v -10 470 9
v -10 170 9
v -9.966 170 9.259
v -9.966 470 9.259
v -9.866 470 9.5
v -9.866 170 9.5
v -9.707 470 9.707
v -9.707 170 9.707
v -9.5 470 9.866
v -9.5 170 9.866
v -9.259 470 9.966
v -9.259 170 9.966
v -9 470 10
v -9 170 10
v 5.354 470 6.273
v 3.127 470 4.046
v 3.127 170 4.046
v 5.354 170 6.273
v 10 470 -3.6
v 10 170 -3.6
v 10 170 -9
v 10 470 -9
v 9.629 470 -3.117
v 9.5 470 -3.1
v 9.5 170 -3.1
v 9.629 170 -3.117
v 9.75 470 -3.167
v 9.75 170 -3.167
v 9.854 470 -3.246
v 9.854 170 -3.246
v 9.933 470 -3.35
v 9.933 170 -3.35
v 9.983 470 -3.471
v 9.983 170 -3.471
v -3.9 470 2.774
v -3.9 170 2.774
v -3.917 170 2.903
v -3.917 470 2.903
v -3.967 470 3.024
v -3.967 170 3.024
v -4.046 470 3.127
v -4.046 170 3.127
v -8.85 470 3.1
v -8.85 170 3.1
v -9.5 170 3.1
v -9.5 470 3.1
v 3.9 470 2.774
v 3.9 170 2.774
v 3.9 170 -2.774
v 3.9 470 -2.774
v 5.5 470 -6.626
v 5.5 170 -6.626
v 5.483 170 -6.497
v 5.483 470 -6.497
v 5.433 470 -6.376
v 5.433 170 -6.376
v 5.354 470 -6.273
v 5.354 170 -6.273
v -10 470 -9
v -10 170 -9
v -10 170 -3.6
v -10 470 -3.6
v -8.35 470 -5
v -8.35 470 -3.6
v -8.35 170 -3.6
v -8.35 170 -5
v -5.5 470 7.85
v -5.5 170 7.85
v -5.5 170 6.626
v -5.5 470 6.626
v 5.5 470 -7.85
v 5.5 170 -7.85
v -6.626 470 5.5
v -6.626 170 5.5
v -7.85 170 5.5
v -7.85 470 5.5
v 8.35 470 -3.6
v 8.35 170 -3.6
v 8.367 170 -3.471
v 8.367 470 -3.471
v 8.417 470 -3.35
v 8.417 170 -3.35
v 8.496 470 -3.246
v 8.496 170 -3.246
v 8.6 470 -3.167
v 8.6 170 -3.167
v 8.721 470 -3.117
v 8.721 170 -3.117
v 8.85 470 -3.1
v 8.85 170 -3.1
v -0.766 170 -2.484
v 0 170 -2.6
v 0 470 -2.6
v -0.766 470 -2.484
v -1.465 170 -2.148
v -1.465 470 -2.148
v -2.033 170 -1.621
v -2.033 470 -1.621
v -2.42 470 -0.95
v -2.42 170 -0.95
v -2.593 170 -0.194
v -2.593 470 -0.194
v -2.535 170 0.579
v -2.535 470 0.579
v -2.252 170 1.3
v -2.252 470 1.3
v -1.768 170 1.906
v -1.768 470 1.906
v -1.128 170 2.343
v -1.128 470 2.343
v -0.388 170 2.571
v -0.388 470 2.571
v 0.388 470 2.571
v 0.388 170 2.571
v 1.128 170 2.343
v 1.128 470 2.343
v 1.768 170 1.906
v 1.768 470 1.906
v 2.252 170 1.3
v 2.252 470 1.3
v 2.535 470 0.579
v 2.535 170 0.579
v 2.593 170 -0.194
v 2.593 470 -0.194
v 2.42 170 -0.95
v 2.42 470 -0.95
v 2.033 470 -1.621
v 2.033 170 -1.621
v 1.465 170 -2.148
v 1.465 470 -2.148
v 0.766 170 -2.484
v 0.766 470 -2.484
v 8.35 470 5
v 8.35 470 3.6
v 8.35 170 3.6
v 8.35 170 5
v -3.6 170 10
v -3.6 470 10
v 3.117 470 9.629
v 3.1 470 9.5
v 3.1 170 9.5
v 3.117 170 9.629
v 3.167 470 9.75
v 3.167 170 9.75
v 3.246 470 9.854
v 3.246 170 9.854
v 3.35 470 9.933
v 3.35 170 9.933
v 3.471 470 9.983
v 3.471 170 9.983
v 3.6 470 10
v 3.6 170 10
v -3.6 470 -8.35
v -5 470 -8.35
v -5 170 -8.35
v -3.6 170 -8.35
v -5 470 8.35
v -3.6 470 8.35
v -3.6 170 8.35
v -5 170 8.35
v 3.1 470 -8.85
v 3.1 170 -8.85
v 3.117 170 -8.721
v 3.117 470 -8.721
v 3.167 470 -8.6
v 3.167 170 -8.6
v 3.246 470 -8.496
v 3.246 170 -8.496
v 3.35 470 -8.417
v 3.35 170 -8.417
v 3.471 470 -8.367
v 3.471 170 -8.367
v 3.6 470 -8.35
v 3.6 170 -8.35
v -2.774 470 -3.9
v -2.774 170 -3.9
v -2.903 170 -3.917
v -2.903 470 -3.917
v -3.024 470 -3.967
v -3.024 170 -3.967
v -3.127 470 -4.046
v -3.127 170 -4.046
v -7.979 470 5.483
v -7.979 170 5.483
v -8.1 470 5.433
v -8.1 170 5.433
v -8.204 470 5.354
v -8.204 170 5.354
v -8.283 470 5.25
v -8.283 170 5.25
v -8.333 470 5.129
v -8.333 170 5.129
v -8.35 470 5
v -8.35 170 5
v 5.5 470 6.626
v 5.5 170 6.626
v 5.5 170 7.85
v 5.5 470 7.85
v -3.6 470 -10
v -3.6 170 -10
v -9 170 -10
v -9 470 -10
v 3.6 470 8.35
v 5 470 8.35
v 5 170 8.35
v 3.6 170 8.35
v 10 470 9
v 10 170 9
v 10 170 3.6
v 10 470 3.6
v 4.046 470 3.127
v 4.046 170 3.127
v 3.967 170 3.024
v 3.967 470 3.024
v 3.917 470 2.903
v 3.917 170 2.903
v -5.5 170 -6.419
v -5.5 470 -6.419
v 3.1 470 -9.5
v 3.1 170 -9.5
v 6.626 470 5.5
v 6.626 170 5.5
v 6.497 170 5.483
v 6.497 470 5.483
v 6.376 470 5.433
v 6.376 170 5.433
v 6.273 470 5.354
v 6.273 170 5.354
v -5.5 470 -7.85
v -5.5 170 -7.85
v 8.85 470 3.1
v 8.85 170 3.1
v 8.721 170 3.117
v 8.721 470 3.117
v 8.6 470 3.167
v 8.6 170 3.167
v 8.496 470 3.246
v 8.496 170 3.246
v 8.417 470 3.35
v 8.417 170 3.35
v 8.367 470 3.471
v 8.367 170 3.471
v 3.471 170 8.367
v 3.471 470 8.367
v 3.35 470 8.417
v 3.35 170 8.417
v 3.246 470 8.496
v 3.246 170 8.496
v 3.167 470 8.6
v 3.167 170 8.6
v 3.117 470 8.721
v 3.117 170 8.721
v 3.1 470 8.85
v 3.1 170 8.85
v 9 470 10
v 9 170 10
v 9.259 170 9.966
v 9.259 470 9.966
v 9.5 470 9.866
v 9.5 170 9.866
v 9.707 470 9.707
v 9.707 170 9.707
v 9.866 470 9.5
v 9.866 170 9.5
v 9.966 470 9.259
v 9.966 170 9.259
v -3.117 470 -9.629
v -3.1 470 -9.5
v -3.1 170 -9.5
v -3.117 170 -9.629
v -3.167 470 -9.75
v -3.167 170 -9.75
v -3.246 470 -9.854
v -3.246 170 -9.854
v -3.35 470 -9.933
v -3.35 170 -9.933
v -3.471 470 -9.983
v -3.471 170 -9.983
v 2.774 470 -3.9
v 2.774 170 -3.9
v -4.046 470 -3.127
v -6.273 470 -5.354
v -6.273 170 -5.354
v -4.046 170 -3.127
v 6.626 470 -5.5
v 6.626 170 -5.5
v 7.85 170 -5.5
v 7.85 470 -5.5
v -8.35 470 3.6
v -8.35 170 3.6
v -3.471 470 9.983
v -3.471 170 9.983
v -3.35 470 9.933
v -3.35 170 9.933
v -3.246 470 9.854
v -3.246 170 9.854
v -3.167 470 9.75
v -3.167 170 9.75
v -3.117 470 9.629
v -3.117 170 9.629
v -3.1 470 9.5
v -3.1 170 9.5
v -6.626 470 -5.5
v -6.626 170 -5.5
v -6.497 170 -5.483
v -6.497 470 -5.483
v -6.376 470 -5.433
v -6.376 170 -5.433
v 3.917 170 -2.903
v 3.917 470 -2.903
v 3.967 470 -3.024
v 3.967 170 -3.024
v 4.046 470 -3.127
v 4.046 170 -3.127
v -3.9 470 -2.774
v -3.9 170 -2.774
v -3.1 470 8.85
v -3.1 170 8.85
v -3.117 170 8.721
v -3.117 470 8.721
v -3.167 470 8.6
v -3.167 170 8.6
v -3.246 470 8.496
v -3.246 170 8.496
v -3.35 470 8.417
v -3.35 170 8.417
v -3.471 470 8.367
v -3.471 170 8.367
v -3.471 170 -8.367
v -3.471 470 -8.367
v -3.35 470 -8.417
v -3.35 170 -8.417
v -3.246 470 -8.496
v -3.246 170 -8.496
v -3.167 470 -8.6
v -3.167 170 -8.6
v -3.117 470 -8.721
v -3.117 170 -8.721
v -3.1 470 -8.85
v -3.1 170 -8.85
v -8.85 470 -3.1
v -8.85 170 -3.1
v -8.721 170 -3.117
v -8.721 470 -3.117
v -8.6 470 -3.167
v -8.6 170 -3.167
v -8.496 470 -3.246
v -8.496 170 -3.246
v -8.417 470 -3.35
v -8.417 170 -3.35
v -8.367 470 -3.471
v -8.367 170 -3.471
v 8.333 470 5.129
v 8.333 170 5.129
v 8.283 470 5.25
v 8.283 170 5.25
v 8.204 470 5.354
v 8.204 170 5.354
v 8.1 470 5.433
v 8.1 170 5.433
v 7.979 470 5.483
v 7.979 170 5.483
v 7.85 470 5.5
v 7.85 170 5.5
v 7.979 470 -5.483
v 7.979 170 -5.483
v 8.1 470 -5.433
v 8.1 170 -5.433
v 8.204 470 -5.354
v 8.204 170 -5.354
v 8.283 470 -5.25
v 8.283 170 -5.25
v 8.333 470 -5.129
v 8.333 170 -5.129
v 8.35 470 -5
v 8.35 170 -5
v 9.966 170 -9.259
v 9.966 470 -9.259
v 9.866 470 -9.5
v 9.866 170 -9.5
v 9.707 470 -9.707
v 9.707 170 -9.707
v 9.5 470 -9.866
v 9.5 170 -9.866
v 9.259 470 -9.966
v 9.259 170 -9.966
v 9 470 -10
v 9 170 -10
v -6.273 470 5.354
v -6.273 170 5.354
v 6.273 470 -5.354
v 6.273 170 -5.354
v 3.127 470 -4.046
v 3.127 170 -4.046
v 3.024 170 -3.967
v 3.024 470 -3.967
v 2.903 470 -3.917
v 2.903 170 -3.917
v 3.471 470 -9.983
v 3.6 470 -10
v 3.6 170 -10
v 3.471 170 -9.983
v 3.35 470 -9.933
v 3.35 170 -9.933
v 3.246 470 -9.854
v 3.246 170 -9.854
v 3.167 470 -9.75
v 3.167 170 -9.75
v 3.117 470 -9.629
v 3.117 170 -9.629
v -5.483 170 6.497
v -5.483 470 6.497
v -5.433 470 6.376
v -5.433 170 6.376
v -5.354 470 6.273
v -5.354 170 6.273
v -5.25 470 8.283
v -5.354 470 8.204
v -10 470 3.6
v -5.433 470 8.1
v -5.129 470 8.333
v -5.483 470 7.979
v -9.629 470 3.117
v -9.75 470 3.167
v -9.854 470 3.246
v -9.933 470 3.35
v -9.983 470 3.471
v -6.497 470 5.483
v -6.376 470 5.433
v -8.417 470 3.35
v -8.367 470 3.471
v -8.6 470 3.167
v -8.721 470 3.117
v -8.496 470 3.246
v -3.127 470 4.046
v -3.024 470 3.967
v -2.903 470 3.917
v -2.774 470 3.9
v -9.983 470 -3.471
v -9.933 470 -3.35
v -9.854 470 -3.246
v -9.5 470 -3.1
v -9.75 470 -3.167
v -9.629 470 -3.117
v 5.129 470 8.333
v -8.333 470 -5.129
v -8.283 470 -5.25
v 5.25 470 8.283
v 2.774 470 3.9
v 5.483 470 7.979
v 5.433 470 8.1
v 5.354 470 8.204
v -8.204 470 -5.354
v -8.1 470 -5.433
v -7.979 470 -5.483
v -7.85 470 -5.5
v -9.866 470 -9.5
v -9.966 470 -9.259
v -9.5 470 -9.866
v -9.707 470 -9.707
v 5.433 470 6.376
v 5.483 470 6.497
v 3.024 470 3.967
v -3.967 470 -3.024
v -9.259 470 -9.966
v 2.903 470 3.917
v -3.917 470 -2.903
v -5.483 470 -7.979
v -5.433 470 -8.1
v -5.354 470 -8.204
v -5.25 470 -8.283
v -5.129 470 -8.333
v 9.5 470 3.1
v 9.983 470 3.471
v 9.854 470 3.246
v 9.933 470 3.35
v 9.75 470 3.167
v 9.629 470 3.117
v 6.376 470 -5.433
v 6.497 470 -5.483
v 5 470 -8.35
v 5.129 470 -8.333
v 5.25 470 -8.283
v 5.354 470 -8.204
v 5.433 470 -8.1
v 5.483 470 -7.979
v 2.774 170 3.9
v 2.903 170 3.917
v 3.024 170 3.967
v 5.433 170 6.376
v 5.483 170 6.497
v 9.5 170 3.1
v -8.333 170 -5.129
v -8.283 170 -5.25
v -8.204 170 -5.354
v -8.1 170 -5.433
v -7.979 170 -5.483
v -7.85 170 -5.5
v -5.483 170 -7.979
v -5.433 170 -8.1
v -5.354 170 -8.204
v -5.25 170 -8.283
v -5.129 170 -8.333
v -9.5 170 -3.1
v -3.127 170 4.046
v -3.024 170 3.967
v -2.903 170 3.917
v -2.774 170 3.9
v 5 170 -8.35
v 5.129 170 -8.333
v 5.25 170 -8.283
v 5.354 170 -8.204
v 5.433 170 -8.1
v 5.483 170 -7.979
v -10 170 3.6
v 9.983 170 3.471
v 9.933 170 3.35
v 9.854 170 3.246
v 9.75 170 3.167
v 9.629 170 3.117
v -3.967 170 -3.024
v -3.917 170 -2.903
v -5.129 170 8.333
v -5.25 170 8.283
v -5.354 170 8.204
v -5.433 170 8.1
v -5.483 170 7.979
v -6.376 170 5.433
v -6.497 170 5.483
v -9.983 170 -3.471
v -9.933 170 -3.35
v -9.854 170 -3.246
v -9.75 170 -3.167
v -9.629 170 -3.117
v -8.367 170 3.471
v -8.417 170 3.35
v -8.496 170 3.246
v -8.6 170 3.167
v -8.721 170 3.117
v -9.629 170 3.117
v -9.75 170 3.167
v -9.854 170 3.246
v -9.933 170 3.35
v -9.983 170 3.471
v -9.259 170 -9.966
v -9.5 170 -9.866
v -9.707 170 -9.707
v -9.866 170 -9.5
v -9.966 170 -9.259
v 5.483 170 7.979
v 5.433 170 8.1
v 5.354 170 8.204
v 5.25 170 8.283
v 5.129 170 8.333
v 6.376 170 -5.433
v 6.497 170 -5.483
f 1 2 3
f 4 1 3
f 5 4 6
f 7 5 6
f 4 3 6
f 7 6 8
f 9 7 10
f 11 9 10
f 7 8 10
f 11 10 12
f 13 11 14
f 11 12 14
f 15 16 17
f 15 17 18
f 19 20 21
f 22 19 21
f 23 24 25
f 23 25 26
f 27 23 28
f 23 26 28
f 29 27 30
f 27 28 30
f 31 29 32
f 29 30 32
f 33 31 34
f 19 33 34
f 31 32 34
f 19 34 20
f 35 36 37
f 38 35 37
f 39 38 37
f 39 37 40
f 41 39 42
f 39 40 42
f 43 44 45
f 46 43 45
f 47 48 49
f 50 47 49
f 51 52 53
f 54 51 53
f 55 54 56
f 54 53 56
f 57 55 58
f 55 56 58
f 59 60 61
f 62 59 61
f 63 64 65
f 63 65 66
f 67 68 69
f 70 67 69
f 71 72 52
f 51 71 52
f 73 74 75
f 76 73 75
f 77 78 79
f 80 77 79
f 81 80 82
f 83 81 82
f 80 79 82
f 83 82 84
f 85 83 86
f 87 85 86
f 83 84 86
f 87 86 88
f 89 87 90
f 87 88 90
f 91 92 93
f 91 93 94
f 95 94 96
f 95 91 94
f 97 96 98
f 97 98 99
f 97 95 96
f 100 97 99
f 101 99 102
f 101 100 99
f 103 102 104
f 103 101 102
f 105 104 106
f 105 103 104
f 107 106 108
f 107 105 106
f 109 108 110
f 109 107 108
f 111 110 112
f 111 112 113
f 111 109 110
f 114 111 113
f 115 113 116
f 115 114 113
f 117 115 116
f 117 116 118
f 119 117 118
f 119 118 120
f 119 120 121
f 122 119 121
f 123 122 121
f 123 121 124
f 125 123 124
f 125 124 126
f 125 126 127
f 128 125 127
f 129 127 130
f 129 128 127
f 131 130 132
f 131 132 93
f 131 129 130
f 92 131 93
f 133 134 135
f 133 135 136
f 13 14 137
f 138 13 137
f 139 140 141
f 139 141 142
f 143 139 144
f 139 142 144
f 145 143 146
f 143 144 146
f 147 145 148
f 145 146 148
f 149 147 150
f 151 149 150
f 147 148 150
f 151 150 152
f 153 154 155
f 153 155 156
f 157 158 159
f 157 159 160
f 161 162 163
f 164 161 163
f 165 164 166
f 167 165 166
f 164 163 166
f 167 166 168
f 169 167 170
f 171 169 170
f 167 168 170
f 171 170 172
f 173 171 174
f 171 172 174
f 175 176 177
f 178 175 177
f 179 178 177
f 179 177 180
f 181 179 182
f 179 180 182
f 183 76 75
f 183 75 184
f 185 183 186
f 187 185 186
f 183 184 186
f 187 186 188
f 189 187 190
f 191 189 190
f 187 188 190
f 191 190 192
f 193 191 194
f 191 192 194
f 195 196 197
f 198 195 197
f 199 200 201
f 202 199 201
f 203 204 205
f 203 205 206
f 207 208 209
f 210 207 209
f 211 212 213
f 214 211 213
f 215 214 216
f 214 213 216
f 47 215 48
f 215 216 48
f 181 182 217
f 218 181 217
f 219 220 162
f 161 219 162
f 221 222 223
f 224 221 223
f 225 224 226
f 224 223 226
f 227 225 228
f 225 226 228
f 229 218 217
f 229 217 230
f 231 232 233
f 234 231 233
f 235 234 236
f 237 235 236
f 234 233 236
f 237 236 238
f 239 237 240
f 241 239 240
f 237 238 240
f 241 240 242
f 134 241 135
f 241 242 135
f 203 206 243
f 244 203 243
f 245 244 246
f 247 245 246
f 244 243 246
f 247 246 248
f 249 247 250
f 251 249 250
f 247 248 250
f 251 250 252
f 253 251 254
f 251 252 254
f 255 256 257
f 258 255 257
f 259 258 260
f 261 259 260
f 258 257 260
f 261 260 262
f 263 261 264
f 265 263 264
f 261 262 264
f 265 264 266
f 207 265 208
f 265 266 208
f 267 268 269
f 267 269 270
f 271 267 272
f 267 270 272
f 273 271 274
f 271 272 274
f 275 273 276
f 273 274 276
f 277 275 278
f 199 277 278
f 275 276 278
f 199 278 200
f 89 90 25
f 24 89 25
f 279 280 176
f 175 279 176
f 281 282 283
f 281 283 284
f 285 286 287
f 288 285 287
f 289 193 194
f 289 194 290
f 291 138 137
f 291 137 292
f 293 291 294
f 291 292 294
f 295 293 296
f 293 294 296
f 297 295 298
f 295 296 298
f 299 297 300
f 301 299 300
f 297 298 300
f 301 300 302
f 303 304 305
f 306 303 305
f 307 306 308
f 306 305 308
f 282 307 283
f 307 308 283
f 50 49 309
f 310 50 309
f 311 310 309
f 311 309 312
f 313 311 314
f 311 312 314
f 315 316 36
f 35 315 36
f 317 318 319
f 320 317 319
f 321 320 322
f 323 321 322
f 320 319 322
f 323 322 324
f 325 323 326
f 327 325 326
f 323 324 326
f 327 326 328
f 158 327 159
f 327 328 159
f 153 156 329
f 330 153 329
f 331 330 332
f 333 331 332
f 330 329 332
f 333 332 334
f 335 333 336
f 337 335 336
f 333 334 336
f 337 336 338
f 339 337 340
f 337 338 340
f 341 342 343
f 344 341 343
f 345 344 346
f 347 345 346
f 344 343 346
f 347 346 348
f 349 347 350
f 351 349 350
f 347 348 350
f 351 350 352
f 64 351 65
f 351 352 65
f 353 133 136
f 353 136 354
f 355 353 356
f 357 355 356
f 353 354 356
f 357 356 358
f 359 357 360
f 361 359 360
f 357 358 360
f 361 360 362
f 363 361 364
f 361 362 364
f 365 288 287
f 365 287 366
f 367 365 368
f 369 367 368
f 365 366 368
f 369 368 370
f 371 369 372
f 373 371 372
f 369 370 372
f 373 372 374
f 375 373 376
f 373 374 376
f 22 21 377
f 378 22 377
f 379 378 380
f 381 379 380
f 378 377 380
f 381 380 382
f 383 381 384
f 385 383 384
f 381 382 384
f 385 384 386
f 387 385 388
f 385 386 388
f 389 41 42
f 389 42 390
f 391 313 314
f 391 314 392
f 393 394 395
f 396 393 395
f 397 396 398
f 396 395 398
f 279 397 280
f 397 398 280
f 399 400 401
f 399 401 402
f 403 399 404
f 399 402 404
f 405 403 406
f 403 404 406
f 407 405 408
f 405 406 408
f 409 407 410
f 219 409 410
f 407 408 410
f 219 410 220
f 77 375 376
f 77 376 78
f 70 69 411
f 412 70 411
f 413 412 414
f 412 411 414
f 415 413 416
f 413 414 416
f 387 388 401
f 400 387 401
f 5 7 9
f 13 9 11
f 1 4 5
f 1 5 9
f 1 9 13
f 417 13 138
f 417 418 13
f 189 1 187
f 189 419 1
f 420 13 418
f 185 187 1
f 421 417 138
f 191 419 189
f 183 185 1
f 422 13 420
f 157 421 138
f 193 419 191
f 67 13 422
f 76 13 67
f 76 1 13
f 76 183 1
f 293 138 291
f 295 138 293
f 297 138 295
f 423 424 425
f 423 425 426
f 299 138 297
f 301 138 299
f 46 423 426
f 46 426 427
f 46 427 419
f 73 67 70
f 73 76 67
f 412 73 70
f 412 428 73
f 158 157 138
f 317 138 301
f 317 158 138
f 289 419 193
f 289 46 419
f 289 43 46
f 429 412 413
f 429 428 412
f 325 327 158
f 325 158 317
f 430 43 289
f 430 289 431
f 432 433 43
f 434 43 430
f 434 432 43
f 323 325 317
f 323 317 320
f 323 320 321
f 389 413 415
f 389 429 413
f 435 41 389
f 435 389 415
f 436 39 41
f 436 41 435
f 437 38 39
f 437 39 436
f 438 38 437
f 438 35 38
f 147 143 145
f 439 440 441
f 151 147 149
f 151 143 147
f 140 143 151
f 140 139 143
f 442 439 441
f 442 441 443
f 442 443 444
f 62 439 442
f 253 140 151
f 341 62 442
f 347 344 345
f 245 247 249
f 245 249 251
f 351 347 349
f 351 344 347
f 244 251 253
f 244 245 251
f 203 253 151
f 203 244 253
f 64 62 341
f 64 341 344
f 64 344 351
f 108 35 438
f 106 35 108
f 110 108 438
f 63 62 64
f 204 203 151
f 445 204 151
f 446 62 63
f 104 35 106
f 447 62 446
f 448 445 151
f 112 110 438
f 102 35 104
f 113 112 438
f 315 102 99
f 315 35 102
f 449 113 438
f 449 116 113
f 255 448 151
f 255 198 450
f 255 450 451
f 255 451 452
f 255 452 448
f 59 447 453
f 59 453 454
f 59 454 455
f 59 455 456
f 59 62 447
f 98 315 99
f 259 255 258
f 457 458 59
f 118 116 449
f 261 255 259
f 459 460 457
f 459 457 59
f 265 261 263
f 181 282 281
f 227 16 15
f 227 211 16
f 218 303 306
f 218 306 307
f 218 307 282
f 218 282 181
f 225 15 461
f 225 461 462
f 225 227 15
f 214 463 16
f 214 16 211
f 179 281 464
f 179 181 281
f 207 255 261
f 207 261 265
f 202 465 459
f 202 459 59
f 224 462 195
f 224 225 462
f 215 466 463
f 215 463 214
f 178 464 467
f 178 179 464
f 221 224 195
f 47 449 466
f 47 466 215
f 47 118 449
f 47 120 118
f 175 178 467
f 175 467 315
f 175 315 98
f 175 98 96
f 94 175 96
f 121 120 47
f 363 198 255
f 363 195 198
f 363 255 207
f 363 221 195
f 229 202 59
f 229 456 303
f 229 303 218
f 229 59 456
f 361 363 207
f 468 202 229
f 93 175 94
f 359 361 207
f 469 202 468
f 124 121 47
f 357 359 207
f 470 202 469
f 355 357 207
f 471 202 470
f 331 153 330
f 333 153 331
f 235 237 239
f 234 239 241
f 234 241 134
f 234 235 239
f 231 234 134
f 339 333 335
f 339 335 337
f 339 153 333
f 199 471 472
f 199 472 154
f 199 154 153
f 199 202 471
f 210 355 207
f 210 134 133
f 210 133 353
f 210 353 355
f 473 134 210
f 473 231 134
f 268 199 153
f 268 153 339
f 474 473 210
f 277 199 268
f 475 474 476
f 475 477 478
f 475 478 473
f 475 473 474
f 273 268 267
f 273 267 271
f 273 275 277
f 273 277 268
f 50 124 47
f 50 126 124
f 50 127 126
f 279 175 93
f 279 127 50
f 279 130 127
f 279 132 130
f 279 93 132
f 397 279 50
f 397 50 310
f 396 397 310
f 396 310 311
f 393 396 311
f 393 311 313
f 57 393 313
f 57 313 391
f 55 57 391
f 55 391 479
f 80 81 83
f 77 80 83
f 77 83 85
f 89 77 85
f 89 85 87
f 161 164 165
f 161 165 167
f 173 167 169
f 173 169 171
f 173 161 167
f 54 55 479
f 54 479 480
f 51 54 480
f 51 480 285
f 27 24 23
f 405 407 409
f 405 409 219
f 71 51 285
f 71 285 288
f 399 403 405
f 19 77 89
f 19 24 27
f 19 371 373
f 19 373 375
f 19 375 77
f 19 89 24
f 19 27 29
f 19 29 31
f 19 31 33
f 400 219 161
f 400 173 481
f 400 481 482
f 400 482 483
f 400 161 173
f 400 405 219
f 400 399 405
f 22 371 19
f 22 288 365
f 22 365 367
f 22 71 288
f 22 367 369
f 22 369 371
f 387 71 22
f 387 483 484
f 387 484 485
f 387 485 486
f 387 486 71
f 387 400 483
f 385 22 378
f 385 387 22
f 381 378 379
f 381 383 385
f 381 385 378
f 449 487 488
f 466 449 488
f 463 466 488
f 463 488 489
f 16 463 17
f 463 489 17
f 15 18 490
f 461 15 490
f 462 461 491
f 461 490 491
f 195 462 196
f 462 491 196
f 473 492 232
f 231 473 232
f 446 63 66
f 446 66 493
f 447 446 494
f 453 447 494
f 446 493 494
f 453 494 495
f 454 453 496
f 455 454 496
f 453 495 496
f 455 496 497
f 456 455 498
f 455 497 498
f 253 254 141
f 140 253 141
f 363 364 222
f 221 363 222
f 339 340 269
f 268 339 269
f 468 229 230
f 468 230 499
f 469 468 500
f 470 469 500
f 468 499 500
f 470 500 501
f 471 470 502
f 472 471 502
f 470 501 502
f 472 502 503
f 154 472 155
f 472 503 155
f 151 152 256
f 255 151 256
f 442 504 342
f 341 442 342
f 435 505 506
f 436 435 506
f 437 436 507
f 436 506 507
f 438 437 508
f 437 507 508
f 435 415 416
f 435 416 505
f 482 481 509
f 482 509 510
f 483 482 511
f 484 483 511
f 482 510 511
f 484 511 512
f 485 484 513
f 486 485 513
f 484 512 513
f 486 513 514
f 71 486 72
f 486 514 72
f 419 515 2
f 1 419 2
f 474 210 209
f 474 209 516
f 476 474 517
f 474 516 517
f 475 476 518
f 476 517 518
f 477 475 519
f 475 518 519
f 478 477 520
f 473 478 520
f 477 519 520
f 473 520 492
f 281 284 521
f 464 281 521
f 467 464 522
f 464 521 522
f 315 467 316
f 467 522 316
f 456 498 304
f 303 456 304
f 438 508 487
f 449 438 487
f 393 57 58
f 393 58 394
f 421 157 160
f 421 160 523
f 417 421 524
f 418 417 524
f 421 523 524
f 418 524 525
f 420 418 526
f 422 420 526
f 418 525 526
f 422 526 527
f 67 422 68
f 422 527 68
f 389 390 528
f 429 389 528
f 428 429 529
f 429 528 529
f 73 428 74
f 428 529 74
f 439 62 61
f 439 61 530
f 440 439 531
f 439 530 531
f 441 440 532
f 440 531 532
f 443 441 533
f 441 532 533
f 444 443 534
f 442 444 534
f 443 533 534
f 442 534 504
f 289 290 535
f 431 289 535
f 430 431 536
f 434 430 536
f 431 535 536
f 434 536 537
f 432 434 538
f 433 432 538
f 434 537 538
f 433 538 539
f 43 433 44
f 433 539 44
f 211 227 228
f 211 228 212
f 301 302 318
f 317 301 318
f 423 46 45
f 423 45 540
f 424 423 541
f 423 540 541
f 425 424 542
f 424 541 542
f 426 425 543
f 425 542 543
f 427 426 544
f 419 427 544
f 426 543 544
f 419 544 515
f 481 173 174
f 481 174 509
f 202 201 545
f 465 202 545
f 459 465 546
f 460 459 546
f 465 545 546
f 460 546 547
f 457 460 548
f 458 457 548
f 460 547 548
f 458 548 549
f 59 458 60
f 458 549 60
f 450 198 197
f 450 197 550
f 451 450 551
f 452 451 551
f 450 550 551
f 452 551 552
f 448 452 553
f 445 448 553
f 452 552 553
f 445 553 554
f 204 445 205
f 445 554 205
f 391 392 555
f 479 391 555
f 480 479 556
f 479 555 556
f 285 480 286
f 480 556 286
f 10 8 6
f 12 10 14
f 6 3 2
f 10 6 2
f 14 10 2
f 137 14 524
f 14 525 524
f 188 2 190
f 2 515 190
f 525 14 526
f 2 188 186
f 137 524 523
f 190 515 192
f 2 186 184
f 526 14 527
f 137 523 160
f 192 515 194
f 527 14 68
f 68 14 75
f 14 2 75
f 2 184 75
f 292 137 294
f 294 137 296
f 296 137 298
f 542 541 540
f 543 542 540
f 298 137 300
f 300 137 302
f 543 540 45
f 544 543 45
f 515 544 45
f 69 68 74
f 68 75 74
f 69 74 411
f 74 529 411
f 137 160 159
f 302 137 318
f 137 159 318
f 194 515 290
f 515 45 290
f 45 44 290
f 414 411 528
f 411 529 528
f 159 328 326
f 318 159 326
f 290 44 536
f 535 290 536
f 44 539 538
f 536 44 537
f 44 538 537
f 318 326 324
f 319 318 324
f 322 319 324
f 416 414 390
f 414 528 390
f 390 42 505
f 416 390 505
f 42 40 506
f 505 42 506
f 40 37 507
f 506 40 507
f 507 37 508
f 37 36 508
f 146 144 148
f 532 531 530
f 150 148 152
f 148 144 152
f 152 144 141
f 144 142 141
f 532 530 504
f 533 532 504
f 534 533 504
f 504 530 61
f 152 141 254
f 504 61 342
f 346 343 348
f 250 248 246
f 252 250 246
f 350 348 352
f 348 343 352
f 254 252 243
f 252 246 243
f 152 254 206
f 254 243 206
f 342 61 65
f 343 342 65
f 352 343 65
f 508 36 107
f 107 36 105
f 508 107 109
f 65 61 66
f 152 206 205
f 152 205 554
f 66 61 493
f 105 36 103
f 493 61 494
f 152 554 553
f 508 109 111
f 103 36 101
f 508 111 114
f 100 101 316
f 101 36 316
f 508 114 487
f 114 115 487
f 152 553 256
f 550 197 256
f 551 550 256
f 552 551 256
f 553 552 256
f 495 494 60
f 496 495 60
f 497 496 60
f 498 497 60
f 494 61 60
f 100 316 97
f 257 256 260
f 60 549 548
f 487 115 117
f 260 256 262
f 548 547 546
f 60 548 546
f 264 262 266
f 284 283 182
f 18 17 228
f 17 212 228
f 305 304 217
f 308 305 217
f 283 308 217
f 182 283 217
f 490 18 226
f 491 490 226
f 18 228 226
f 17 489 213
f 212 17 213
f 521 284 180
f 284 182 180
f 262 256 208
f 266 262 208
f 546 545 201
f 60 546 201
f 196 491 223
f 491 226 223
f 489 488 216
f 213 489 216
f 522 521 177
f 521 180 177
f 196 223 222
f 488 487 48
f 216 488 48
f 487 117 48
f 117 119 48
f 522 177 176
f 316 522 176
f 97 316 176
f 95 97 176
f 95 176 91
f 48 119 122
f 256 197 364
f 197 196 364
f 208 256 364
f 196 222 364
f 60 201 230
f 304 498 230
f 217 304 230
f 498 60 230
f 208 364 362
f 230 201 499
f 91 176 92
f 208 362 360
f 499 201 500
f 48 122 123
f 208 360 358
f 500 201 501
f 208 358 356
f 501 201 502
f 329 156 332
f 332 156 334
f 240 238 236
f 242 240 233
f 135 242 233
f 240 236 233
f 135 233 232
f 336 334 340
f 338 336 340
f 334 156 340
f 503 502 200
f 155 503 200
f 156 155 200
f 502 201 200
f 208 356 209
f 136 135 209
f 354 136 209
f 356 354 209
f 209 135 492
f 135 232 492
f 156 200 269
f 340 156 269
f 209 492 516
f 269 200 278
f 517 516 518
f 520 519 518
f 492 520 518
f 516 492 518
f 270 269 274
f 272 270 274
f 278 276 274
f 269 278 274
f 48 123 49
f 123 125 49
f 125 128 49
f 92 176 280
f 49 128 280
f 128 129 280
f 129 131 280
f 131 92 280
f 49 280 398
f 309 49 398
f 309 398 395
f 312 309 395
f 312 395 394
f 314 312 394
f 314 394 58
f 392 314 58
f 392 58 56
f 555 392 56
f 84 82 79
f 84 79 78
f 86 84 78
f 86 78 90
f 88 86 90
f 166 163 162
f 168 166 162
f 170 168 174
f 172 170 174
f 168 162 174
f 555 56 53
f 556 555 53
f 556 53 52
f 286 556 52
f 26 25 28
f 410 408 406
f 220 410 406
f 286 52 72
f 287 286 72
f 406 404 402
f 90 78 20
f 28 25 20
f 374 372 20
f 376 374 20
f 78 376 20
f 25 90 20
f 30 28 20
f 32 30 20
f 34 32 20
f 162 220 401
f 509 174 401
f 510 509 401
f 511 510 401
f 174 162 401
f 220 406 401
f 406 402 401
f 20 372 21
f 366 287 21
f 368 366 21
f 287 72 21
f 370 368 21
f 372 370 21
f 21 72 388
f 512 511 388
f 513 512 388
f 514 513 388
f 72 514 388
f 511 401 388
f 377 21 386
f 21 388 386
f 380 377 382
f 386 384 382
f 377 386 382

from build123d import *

# Parameters (mm, degrees)
SKETCH_1_R      = 2.6
EXTRUDE_2_DEPTH = 300


with BuildPart() as part:
    # 草图1 → 凸台-拉伸2 (new body)
    with BuildSketch(Plane(origin=(0, 170, 0), x_dir=(1, 0, 0), z_dir=(0, 1, 0))):
        with BuildLine():
            Line((-3.1, 8.85), (-3.1, 9.5))
            ThreePointArc((-3.1, 9.5), (-3.246446609, 9.853553391), (-3.6, 10))
            Line((-3.6, 10), (-9, 10))
            ThreePointArc((-9, 10), (-9.707106781, 9.707106781), (-10, 9))
            Line((-10, 9), (-10, 3.6))
            ThreePointArc((-10, 3.6), (-9.853553391, 3.246446609), (-9.5, 3.1))
            Line((-9.5, 3.1), (-8.85, 3.1))
            ThreePointArc((-8.85, 3.1), (-8.496446609, 3.246446609), (-8.35, 3.6))
            Line((-8.35, 3.6), (-8.35, 5))
            ThreePointArc((-8.35, 5), (-8.203553391, 5.353553391), (-7.85, 5.5))
            Line((-7.85, 5.5), (-6.626345597, 5.5))
            ThreePointArc((-6.626345597, 5.5), (-6.435003881, 5.461939766), (-6.272792206, 5.353553391))
            Line((-6.272792206, 5.353553391), (-4.046446609, 3.127207794))
            ThreePointArc((-4.046446609, 3.127207794), (-3.938060234, 2.964996119), (-3.9, 2.773654403))
            Line((-3.9, 2.773654403), (-3.9, -2.773654403))
            ThreePointArc((-3.9, -2.773654403), (-3.938060234, -2.964996119), (-4.046446609, -3.127207794))
            Line((-4.046446609, -3.127207794), (-6.272792206, -5.353553391))
            ThreePointArc((-6.272792206, -5.353553391), (-6.435003881, -5.461939766), (-6.626345597, -5.5))
            Line((-6.626345597, -5.5), (-7.85, -5.5))
            ThreePointArc((-7.85, -5.5), (-8.203553391, -5.353553391), (-8.35, -5))
            Line((-8.35, -5), (-8.35, -3.6))
            ThreePointArc((-8.35, -3.6), (-8.496446609, -3.246446609), (-8.85, -3.1))
            Line((-8.85, -3.1), (-9.5, -3.1))
            ThreePointArc((-9.5, -3.1), (-9.853553391, -3.246446609), (-10, -3.6))
            Line((-10, -3.6), (-10, -9))
            ThreePointArc((-10, -9), (-9.707106781, -9.707106781), (-9, -10))
            Line((-9, -10), (-3.6, -10))
            ThreePointArc((-3.6, -10), (-3.246446609, -9.853553391), (-3.1, -9.5))
            Line((-3.1, -9.5), (-3.1, -8.85))
            ThreePointArc((-3.1, -8.85), (-3.246446609, -8.496446609), (-3.6, -8.35))
            Line((-3.6, -8.35), (-5, -8.35))
            ThreePointArc((-5, -8.35), (-5.353553391, -8.203553391), (-5.5, -7.85))
            Line((-5.5, -7.85), (-5.5, -6.626345597))
            ThreePointArc((-5.5, -6.626345597), (-5.461939766, -6.435003881), (-5.353553391, -6.272792206))
            Line((-5.353553391, -6.272792206), (-3.127207794, -4.046446609))
            ThreePointArc((-3.127207794, -4.046446609), (-2.964996119, -3.938060234), (-2.773654403, -3.9))
            Line((-2.773654403, -3.9), (2.773654403, -3.9))
            ThreePointArc((2.773654403, -3.9), (2.964996119, -3.938060234), (3.127207794, -4.046446609))
            Line((3.127207794, -4.046446609), (5.353553391, -6.272792206))
            ThreePointArc((5.353553391, -6.272792206), (5.461939766, -6.435003881), (5.5, -6.626345597))
            Line((5.5, -6.626345597), (5.5, -7.85))
            ThreePointArc((5.5, -7.85), (5.353553391, -8.203553391), (5, -8.35))
            Line((5, -8.35), (3.6, -8.35))
            ThreePointArc((3.6, -8.35), (3.246446609, -8.496446609), (3.1, -8.85))
            Line((3.1, -8.85), (3.1, -9.5))
            ThreePointArc((3.1, -9.5), (3.246446609, -9.853553391), (3.6, -10))
            Line((3.6, -10), (9, -10))
            ThreePointArc((9, -10), (9.707106781, -9.707106781), (10, -9))
            Line((10, -9), (10, -3.6))
            ThreePointArc((10, -3.6), (9.853553391, -3.246446609), (9.5, -3.1))
            Line((9.5, -3.1), (8.85, -3.1))
            ThreePointArc((8.85, -3.1), (8.496446609, -3.246446609), (8.35, -3.6))
            Line((8.35, -3.6), (8.35, -5))
            ThreePointArc((8.35, -5), (8.203553391, -5.353553391), (7.85, -5.5))
            Line((7.85, -5.5), (6.626345597, -5.5))
            ThreePointArc((6.626345597, -5.5), (6.435003881, -5.461939766), (6.272792206, -5.353553391))
            Line((6.272792206, -5.353553391), (4.046446609, -3.127207794))
            ThreePointArc((4.046446609, -3.127207794), (3.938060234, -2.964996119), (3.9, -2.773654403))
            Line((3.9, -2.773654403), (3.9, 2.773654403))
            ThreePointArc((3.9, 2.773654403), (3.938060234, 2.964996119), (4.046446609, 3.127207794))
            Line((4.046446609, 3.127207794), (6.272792206, 5.353553391))
            ThreePointArc((6.272792206, 5.353553391), (6.435003881, 5.461939766), (6.626345597, 5.5))
            Line((6.626345597, 5.5), (7.85, 5.5))
            ThreePointArc((7.85, 5.5), (8.203553391, 5.353553391), (8.35, 5))
            Line((8.35, 5), (8.35, 3.6))
            ThreePointArc((8.35, 3.6), (8.496446609, 3.246446609), (8.85, 3.1))
            Line((8.85, 3.1), (9.5, 3.1))
            ThreePointArc((9.5, 3.1), (9.853553391, 3.246446609), (10, 3.6))
            Line((10, 3.6), (10, 9))
            ThreePointArc((10, 9), (9.707106781, 9.707106781), (9, 10))
            Line((9, 10), (3.6, 10))
            ThreePointArc((3.6, 10), (3.246446609, 9.853553391), (3.1, 9.5))
            Line((3.1, 9.5), (3.1, 8.85))
            ThreePointArc((3.1, 8.85), (3.246446609, 8.496446609), (3.6, 8.35))
            Line((3.6, 8.35), (5, 8.35))
            ThreePointArc((5, 8.35), (5.353553391, 8.203553391), (5.5, 7.85))
            Line((5.5, 7.85), (5.5, 6.626345597))
            ThreePointArc((5.5, 6.626345597), (5.461939766, 6.435003881), (5.353553391, 6.272792206))
            Line((5.353553391, 6.272792206), (3.127207794, 4.046446609))
            ThreePointArc((3.127207794, 4.046446609), (2.964996119, 3.938060234), (2.773654403, 3.9))
            Line((2.773654403, 3.9), (-2.773654403, 3.9))
            ThreePointArc((-2.773654403, 3.9), (-2.964996119, 3.938060234), (-3.127207794, 4.046446609))
            Line((-3.127207794, 4.046446609), (-5.5, 6.419238816))
            Line((-5.5, 6.419238816), (-5.5, 7.85))
            ThreePointArc((-5.5, 7.85), (-5.353553391, 8.203553391), (-5, 8.35))
            Line((-5, 8.35), (-3.6, 8.35))
            ThreePointArc((-3.6, 8.35), (-3.246446609, 8.496446609), (-3.1, 8.85))
        make_face()
        with Locations(Location((0, 0, 0), (0, 0, 90))):
            Circle(SKETCH_1_R, mode=Mode.SUBTRACT)
    extrude(amount=EXTRUDE_2_DEPTH)


solid = part.part
